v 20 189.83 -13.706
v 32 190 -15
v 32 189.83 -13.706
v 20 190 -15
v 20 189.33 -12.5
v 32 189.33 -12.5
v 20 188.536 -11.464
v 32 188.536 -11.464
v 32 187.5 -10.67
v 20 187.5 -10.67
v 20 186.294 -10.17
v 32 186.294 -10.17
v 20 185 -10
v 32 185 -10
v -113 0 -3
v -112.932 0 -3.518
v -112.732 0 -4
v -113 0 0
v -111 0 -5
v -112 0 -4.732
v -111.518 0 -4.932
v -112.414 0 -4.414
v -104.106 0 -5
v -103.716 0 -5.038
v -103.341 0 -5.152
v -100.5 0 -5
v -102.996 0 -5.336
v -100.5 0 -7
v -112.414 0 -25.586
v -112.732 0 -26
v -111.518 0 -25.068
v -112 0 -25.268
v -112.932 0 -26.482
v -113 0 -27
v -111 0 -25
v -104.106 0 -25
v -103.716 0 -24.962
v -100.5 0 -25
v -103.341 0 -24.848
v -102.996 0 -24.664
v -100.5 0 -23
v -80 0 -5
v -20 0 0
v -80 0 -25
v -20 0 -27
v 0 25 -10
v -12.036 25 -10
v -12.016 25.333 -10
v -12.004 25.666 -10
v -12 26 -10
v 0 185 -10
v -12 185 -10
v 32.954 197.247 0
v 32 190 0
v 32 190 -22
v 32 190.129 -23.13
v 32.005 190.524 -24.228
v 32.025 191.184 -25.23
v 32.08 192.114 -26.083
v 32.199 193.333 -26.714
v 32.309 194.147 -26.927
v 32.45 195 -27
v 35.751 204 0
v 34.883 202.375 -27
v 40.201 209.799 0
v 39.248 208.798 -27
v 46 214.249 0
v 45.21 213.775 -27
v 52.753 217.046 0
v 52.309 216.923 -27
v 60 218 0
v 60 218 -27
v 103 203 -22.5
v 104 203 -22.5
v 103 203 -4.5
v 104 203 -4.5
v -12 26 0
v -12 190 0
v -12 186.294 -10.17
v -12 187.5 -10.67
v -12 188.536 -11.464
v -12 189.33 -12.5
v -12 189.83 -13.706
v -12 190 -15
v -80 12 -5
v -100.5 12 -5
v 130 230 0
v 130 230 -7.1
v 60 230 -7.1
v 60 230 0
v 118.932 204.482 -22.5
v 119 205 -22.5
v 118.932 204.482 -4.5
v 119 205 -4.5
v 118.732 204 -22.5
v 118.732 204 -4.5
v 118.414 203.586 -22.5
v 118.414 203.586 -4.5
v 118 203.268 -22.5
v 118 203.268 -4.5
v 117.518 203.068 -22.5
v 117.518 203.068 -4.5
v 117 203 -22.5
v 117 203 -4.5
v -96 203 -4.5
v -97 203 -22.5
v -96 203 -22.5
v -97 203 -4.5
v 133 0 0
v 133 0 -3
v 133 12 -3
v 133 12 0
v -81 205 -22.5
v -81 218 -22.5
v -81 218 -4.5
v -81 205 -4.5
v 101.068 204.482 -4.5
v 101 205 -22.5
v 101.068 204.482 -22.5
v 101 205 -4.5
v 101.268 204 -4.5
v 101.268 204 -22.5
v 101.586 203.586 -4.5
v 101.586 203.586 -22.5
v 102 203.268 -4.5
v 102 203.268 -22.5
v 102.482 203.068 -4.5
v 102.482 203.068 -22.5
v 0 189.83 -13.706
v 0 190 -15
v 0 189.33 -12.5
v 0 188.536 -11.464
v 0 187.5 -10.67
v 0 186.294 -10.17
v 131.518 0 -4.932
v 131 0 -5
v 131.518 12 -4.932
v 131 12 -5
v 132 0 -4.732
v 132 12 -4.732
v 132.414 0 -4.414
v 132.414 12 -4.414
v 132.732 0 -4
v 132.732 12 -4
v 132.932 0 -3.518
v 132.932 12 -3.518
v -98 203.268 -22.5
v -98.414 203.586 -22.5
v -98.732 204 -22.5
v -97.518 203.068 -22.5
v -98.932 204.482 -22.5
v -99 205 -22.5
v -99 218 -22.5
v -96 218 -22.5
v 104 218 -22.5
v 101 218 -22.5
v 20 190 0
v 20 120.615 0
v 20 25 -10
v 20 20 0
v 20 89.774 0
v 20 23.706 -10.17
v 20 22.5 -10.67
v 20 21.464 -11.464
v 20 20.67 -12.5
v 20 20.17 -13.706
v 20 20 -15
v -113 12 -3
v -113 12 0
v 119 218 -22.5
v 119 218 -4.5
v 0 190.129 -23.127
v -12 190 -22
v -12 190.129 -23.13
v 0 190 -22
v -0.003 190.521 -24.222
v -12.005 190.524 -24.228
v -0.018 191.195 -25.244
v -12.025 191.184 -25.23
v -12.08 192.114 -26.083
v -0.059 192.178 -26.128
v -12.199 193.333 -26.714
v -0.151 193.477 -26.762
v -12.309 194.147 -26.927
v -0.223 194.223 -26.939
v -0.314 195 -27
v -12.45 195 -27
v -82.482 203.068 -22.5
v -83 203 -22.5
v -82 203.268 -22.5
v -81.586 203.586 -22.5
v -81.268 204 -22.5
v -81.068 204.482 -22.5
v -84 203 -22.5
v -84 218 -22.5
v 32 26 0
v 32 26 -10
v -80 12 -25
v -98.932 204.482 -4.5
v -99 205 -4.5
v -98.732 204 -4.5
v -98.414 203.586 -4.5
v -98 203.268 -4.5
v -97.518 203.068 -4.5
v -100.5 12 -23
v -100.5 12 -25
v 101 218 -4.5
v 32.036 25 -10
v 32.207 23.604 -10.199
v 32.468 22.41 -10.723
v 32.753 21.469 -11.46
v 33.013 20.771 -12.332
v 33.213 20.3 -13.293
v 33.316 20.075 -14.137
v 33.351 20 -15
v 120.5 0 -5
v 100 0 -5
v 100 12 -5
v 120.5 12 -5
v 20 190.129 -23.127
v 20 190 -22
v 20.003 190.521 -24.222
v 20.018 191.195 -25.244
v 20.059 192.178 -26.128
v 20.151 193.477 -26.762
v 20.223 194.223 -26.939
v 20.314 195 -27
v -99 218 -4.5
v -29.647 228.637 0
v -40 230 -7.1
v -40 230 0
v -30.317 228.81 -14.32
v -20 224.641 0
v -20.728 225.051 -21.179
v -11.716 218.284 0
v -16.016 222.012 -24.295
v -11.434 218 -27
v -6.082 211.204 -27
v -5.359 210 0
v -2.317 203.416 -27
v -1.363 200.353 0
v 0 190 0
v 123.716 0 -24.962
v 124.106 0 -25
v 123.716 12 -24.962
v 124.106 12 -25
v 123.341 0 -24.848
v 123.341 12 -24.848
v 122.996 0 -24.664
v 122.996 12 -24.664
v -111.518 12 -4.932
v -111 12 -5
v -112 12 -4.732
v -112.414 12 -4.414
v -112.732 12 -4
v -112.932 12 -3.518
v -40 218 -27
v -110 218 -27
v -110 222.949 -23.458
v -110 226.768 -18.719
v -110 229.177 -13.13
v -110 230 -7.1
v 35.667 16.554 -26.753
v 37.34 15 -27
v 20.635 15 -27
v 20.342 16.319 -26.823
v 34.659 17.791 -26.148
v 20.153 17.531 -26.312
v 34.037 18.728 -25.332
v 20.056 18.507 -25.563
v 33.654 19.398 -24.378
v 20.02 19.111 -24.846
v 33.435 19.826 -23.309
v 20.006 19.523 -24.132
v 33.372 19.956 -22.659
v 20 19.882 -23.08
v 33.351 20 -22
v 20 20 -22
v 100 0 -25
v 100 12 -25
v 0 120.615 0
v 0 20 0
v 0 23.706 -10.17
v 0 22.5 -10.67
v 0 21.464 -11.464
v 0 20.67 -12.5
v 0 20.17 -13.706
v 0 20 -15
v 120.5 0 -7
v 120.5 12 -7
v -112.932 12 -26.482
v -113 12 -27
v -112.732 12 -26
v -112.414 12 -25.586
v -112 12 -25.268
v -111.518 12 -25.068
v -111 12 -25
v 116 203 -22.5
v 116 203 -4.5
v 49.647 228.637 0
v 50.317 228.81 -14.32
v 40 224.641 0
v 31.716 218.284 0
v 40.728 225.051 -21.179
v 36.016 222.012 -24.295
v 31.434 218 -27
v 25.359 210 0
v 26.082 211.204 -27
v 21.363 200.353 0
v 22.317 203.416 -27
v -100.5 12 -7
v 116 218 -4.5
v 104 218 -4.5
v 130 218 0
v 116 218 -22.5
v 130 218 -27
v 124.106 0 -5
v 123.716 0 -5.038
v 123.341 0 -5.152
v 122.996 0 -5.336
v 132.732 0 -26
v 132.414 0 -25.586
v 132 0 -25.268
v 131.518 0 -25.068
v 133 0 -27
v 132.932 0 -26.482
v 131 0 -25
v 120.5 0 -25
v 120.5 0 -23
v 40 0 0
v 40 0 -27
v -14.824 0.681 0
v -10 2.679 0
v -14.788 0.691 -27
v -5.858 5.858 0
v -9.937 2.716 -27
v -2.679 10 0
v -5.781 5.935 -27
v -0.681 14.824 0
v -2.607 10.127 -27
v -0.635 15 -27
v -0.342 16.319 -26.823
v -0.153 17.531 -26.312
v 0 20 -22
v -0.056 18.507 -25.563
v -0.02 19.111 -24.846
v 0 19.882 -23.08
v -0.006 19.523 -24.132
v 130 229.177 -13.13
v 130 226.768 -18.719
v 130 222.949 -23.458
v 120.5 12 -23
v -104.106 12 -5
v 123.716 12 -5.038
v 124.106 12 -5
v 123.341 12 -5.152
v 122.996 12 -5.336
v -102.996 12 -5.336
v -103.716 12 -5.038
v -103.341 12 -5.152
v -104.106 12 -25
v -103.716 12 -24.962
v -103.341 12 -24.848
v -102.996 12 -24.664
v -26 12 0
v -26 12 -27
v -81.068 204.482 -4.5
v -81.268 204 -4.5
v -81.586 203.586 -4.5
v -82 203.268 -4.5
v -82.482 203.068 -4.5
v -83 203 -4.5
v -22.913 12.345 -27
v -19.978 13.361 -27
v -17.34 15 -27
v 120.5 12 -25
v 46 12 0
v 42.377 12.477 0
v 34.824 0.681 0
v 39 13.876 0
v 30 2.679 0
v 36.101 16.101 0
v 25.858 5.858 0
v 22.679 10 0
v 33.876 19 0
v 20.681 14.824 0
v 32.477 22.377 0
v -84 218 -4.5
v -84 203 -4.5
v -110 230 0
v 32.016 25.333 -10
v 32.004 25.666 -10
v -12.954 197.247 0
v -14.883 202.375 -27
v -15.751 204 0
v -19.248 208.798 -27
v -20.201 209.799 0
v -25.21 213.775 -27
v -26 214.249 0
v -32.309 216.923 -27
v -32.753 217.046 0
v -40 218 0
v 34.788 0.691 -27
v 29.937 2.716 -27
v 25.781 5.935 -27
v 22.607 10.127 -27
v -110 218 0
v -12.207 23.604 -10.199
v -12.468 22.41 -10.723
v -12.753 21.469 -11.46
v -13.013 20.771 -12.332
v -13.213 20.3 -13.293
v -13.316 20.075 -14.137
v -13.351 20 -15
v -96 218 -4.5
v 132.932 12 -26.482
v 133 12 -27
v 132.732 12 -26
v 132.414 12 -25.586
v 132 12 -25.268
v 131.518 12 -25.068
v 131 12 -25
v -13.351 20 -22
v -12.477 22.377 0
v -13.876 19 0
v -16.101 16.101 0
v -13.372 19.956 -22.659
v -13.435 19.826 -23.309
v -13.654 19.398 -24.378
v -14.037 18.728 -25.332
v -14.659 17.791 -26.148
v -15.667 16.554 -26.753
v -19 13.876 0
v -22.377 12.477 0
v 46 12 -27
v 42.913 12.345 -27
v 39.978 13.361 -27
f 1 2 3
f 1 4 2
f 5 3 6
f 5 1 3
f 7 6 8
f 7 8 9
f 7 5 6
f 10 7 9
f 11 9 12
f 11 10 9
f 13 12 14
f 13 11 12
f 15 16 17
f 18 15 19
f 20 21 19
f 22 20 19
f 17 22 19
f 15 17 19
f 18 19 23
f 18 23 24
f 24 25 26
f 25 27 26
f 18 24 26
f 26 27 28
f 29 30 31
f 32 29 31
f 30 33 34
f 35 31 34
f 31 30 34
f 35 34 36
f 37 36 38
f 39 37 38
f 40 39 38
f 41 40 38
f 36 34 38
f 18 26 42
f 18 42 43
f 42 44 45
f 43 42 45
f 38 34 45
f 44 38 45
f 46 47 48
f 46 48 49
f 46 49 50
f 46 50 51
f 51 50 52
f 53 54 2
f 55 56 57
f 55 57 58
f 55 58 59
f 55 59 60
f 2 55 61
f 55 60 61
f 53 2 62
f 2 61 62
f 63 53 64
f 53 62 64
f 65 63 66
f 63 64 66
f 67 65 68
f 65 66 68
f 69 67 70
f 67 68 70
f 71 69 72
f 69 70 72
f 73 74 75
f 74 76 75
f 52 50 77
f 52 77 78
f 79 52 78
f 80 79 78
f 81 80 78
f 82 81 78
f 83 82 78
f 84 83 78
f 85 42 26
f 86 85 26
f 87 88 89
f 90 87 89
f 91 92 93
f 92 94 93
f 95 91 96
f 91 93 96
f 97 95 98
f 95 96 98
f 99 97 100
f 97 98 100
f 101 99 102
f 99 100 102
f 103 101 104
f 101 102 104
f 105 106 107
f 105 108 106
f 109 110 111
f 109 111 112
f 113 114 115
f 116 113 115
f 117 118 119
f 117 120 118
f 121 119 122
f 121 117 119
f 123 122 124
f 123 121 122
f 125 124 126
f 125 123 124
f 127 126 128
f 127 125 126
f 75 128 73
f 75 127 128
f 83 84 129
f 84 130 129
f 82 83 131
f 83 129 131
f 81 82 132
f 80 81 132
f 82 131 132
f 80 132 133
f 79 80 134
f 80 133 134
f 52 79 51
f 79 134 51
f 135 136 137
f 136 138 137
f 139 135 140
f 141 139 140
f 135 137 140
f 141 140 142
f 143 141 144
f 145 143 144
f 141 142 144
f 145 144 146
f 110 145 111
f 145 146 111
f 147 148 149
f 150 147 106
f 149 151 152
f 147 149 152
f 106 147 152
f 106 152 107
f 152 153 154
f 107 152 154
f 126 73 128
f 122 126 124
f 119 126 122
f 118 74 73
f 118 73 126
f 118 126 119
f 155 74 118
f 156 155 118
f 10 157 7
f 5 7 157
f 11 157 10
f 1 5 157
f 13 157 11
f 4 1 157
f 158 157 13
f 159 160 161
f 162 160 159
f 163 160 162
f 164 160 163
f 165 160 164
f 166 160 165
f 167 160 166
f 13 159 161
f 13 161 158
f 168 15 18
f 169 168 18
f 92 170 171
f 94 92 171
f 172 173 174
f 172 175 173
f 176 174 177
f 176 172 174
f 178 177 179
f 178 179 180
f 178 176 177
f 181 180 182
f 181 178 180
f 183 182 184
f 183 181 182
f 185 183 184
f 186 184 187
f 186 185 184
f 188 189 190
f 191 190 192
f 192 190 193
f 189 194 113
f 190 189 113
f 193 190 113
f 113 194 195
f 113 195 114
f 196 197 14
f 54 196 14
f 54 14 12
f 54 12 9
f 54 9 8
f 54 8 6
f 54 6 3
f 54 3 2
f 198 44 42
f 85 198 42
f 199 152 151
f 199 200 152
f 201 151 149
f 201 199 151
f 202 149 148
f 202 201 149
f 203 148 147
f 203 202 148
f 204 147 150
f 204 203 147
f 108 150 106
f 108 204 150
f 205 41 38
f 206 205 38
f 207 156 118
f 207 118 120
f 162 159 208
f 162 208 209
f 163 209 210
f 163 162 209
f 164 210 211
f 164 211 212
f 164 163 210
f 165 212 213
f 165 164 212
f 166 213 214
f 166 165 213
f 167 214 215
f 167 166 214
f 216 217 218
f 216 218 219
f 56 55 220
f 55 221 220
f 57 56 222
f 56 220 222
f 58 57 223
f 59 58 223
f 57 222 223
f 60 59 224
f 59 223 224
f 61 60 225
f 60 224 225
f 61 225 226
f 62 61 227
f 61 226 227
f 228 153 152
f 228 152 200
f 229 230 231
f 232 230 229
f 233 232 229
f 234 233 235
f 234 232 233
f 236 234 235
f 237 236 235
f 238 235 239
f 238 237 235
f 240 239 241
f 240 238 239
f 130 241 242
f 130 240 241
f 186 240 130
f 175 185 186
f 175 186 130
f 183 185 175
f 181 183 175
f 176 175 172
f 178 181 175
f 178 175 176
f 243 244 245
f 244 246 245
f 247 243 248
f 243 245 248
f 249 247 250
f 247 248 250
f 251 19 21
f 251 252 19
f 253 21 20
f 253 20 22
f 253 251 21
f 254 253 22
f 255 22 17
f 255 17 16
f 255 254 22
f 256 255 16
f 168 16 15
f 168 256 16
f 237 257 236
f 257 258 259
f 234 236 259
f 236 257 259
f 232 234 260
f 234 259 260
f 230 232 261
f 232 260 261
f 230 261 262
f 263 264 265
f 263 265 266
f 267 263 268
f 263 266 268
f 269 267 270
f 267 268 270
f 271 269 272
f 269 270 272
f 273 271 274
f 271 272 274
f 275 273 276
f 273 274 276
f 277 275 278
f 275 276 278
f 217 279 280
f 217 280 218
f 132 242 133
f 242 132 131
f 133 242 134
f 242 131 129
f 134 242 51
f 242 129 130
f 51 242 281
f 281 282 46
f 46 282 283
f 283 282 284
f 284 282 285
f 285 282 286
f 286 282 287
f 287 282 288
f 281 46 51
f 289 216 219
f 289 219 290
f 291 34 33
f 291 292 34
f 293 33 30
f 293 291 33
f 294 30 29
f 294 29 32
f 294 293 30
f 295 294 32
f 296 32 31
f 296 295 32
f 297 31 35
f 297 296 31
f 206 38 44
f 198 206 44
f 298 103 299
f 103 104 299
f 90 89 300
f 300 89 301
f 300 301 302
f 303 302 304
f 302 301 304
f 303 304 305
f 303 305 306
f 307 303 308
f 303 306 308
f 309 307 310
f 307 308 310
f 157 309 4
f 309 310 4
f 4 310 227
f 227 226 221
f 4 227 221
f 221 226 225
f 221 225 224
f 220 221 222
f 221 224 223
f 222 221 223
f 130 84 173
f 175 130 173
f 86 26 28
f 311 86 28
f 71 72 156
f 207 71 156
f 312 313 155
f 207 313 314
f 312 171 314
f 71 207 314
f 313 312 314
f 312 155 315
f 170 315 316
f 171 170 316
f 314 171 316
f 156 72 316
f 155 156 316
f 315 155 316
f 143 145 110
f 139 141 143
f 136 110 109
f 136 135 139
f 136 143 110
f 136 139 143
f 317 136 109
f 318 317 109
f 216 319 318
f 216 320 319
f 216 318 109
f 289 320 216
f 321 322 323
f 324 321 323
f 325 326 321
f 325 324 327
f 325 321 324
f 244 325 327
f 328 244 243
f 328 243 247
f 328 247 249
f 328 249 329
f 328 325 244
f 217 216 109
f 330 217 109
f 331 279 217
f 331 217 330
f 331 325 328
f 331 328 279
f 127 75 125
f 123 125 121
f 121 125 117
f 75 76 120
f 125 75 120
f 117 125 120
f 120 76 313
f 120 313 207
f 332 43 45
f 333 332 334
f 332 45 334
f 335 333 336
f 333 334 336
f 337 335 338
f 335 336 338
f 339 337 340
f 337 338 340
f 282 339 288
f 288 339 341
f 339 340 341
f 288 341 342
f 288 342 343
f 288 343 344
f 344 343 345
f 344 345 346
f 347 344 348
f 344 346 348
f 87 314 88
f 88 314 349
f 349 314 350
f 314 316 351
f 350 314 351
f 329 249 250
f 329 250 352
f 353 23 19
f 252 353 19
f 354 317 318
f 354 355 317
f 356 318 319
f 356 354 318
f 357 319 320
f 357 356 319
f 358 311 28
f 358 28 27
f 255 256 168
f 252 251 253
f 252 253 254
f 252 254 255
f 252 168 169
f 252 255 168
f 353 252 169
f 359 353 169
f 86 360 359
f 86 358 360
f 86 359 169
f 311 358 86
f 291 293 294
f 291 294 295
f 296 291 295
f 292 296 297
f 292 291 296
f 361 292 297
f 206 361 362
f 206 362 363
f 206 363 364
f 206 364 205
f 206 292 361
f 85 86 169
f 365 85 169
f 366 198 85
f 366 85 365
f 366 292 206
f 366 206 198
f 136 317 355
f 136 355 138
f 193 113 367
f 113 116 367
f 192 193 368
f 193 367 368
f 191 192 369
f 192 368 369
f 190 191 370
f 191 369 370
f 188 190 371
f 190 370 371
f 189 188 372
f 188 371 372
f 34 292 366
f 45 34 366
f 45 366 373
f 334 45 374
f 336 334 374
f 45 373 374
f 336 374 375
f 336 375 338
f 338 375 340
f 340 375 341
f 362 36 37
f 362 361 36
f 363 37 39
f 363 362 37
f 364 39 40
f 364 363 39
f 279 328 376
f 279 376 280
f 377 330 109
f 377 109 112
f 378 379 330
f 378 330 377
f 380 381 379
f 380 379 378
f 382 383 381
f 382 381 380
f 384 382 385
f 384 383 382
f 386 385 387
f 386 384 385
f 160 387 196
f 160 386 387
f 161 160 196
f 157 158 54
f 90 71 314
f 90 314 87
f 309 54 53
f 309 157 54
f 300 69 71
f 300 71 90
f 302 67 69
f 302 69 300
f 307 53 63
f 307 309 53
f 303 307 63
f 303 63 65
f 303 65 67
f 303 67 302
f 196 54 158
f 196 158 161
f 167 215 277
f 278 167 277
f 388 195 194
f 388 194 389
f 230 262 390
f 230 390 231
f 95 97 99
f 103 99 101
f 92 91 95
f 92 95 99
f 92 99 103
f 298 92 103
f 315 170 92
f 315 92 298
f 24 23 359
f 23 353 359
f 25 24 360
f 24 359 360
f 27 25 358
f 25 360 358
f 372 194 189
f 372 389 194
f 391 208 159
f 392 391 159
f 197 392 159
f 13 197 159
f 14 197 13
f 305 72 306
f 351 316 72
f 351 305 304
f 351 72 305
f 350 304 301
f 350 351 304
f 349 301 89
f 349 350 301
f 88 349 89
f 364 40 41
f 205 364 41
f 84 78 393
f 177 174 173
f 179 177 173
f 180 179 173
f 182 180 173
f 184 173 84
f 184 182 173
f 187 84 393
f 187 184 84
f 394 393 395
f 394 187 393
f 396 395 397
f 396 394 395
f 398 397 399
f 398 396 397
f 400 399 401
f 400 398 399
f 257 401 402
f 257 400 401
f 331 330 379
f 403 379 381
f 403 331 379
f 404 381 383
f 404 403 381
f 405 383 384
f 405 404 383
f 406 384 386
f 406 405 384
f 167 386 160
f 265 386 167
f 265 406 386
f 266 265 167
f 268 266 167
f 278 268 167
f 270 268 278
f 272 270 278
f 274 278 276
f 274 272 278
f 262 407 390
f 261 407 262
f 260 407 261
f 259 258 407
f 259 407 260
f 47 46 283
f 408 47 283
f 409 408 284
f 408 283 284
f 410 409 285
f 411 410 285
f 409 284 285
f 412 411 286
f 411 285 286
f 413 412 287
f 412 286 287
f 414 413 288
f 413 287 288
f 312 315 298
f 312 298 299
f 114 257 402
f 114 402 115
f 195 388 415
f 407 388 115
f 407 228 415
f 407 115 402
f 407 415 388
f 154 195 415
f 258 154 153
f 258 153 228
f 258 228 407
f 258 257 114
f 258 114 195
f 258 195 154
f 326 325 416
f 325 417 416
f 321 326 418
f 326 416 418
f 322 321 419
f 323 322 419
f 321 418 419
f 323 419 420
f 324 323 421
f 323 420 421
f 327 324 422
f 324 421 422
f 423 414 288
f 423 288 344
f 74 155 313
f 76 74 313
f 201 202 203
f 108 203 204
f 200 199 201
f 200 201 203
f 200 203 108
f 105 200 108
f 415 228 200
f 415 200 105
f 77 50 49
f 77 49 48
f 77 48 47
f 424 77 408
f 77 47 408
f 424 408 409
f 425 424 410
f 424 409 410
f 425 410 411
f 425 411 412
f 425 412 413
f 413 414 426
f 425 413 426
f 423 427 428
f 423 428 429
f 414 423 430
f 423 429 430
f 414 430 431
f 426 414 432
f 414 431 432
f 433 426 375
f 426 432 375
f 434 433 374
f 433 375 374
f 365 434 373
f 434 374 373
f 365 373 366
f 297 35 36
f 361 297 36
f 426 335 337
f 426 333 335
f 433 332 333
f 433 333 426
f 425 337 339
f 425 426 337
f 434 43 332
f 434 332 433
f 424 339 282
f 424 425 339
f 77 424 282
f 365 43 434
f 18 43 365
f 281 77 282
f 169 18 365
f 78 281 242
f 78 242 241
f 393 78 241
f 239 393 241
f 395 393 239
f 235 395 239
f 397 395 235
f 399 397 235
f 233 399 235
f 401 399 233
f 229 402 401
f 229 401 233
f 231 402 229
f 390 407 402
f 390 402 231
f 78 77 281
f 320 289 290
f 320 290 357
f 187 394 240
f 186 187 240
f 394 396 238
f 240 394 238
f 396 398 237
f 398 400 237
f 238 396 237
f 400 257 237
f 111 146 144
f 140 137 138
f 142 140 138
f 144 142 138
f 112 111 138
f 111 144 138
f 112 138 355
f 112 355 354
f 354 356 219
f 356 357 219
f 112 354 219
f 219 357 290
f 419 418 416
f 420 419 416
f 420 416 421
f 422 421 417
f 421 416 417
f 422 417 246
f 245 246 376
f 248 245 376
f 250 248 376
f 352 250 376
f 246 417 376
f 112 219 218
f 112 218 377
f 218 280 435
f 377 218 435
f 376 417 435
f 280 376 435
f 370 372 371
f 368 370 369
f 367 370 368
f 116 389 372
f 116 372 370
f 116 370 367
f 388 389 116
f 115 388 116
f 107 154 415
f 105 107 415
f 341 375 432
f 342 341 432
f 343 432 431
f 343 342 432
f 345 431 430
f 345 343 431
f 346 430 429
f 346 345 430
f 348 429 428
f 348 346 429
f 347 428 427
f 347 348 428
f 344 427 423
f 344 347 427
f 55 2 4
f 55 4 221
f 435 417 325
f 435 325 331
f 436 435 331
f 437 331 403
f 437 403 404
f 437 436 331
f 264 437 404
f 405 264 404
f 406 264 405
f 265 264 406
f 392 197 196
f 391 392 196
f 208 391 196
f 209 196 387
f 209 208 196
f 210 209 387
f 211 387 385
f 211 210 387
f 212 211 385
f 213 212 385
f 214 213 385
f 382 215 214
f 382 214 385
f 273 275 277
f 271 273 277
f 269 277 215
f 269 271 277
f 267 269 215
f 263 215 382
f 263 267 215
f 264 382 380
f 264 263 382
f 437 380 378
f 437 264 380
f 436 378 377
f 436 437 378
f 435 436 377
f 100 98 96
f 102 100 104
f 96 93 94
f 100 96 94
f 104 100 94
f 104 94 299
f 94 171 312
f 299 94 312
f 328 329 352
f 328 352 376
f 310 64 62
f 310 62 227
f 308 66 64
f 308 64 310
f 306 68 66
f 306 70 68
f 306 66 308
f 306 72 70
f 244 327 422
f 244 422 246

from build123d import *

# Parameters (mm, degrees)
EXTRUDE_1_DEPTH          = 12
EXTRUDE_2_DEPTH          = 27
SKETCH_6_W               = 3
SKETCH_6_H               = 18
EXTRUDE_3_DEPTH          = 15
EXTRUDE_4_DEPTH          = 27
CUT_EXTRUDE_4_DEPTH      = 258.678093753
CUT_EXTRUDE_5_DEPTH      = 257.376676006
FILLET_1_R               = 2
CUT_EXTRUDE_6_DEPTH      = 258.678093852
CUT_EXTRUDE_6_DEPTH_BACK = 258.678093852
SKETCH_10_W              = 17
SKETCH_10_H              = 170
FILLET_3_R               = 5
FILLET_4_R               = 2
SKETCH_11_W              = 17.589791481
SKETCH_11_H              = 30.84175393
EXTRUDE_5_DEPTH          = 10
CUT_EXTRUDE_7_REACH      = 268.268
SKETCH_12_W              = 20
SKETCH_12_H              = 30.84175393


with BuildPart() as part:
    # 草图1 → 凸台-拉伸1 (new body)
    with BuildSketch(Plane(origin=(0, 0, 0), x_dir=(1, 0, 0), z_dir=(0, 1, 0))):
        Polygon((-113, 5), (-113, 0), (0, 0), (0, 27), (-113, 27), (-113, 25), (-103.5, 25), (-100.5, 23), (-100.5, 25), (-80, 25), (-80, 5), (-100.5, 5), (-100.5, 7), (-103.5, 5), align=None)
    extrude(amount=EXTRUDE_1_DEPTH)

    # 草图5 → 凸台-拉伸2 (add)
    with BuildSketch(Plane(origin=(0, 0, -27), x_dir=(-1, 0, 0), z_dir=(0, 0, -1))):
        with BuildLine():
            Line((0, 0), (12, 0))
            Line((12, 0), (12, 190))
            ThreePointArc((12, 190), (20.201010127, 209.798989873), (40, 218))
            Line((40, 218), (110, 218))
            Line((110, 218), (110, 230))
            Line((110, 230), (40, 230))
            ThreePointArc((40, 230), (11.715728753, 218.284271247), (0, 190))
            Line((0, 190), (0, 0))
        make_face()
    extrude(amount=-EXTRUDE_2_DEPTH)

    # 草图6 → 凸台-拉伸3 (add)
    with BuildSketch(Plane.XZ.offset(-218)):
        with Locations((-97.5, -13.5)):
            Rectangle(SKETCH_6_W, SKETCH_6_H)
        with Locations((-82.5, -13.5)):
            Rectangle(SKETCH_6_W, SKETCH_6_H)
    extrude(amount=EXTRUDE_3_DEPTH)

    # 草图7 → 凸台-拉伸4 (add)
    with BuildSketch(Plane(origin=(0, 0, -27), x_dir=(-1, 0, 0), z_dir=(0, 0, -1))):
        with BuildLine():
            Line((26, 12), (12, 12))
            Line((12, 12), (12, 26))
            ThreePointArc((12, 26), (16.100505063, 16.100505063), (26, 12))
        make_face()
    extrude(amount=-EXTRUDE_4_DEPTH)

    # 草图8 → 切除-拉伸4 (cut, through all)
    with BuildSketch(Plane(origin=(0, 0, -27), x_dir=(-1, 0, 0), z_dir=(0, 0, -1))):
        with BuildLine():
            Line((0, 20), (0, 0))
            Line((0, 0), (20, 0))
            ThreePointArc((20, 0), (5.857864376, 5.857864376), (0, 20))
        make_face()
    extrude(amount=-CUT_EXTRUDE_4_DEPTH, mode=Mode.SUBTRACT)

    # 草图9 → 切除-拉伸5 (cut, through all)
    with BuildSketch(Plane.ZY.offset(110)):
        with BuildLine():
            Line((-27, 230), (-27, 218))
            ThreePointArc((-27, 218), (-18.719201296, 226.767848868), (-7.100251258, 230))
            Line((-7.100251258, 230), (-27, 230))
        make_face()
    extrude(amount=-CUT_EXTRUDE_5_DEPTH, mode=Mode.SUBTRACT)

    # 圆角1
    fillet_1_edges = [part.edges().sort_by_distance(p)[0] for p in [
        (-99, 203, -13.5),
        (-81, 203, -13.5),
    ]]
    fillet(fillet_1_edges, radius=FILLET_1_R)

    # 草图10 → 切除-拉伸6 (cut, two sides: drawn at the far end of the back side and taken through both)
    with BuildSketch(Plane(origin=(0, 0, 0), x_dir=(0, 0, -1), z_dir=(1, 0, 0)).offset(-CUT_EXTRUDE_6_DEPTH_BACK)):
        with Locations((18.5, 105)):
            Rectangle(SKETCH_10_W, SKETCH_10_H)
    extrude(amount=CUT_EXTRUDE_6_DEPTH + CUT_EXTRUDE_6_DEPTH_BACK, mode=Mode.SUBTRACT)

    # 圆角3
    fillet_3_edges = [part.edges().sort_by_distance(p)[0] for p in [
        (-6.67544468, 20, -27),
        (-6, 190, -27),
        (-6.67544468, 20, -10),
        (-6, 190, -10),
    ]]
    fillet(fillet_3_edges, radius=FILLET_3_R)

    # 圆角4
    fillet_4_edges = [part.edges().sort_by_distance(p)[0] for p in [
        (-113, 6, -5),
        (-103.5, 6, -5),
        (-103.5, 6, -25),
        (-113, 6, -25),
    ]]
    fillet(fillet_4_edges, radius=FILLET_4_R - 0.0001)  # a hair under: the kernel refuses the full size

    # 草图11 → 凸台-拉伸5 (add)
    with BuildSketch(Plane(origin=(10, 0, 0), x_dir=(0, 0, -1), z_dir=(1, 0, 0))):
        with Locations((8.794895741, 105.194403444)):
            Rectangle(SKETCH_11_W, SKETCH_11_H)
    extrude(amount=-EXTRUDE_5_DEPTH)

    # 镜向8: part across plane


with BuildPart() as part_1:
    add(part.part)
    add(part.part.mirror(Plane(origin=(10, 0, 0), x_dir=(0, 0, 1), z_dir=(1, 0, 0))))

    # 草图12 → 切除-拉伸7 (cut, up to next)
    with BuildSketch(Plane(origin=(0, 0, -17.589791481), x_dir=(-1, 0, 0), z_dir=(0, 0, -1)), mode=Mode.PRIVATE) as cut_extrude_7_sk1:
        with Locations((-10, 105.194403444)):
            Rectangle(SKETCH_12_W, SKETCH_12_H)
    cut_extrude_7_tool1 = extrude(cut_extrude_7_sk1.sketch, amount=-CUT_EXTRUDE_7_REACH, mode=Mode.PRIVATE) & part_1.part
    add(cut_extrude_7_tool1.solids().sort_by_distance((10, 105.194403, -17.589791))[0], mode=Mode.SUBTRACT)


with BuildPart() as cut_extrude_7_piece_1:
    # of the separate pieces the step leaves, piece 1, a body of its own (cut_extrude_7_pieces)
    add(part_1.part.solids().sort_by_distance((-102.996176075, 12, -5.335882616))[0])


with BuildPart() as cut_extrude_7_piece_2:
    # of the separate pieces the step leaves, piece 2, a body of its own (cut_extrude_7_pieces)
    add(part_1.part.solids().sort_by_distance((20, 20, 0))[0])


solid = Compound([cut_extrude_7_piece_1.part, cut_extrude_7_piece_2.part])
